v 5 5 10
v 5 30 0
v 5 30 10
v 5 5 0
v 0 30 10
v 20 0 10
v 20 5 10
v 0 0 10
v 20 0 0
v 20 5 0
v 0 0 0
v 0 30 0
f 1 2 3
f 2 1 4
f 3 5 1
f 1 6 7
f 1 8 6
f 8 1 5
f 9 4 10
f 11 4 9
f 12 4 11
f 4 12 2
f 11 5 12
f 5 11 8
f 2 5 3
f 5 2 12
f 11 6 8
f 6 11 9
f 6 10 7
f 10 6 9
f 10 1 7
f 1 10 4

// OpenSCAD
// file: ../inner/battery-cover-front-right-inner.scad
module frontRightInnerBatteryCover(base_leg=20, vertical_leg=30, leg_width=5, height=10)
{
    union() {
        // Vertical leg
        cube(size=[leg_width, vertical_leg, height]);
        // Base leg
        cube(size=[base_leg, leg_width, height]);
    }
}
// main file
//#use <../../>

use <../inner/battery-cover-front-right-inner.scad>



frontRightInnerBatteryCover();
